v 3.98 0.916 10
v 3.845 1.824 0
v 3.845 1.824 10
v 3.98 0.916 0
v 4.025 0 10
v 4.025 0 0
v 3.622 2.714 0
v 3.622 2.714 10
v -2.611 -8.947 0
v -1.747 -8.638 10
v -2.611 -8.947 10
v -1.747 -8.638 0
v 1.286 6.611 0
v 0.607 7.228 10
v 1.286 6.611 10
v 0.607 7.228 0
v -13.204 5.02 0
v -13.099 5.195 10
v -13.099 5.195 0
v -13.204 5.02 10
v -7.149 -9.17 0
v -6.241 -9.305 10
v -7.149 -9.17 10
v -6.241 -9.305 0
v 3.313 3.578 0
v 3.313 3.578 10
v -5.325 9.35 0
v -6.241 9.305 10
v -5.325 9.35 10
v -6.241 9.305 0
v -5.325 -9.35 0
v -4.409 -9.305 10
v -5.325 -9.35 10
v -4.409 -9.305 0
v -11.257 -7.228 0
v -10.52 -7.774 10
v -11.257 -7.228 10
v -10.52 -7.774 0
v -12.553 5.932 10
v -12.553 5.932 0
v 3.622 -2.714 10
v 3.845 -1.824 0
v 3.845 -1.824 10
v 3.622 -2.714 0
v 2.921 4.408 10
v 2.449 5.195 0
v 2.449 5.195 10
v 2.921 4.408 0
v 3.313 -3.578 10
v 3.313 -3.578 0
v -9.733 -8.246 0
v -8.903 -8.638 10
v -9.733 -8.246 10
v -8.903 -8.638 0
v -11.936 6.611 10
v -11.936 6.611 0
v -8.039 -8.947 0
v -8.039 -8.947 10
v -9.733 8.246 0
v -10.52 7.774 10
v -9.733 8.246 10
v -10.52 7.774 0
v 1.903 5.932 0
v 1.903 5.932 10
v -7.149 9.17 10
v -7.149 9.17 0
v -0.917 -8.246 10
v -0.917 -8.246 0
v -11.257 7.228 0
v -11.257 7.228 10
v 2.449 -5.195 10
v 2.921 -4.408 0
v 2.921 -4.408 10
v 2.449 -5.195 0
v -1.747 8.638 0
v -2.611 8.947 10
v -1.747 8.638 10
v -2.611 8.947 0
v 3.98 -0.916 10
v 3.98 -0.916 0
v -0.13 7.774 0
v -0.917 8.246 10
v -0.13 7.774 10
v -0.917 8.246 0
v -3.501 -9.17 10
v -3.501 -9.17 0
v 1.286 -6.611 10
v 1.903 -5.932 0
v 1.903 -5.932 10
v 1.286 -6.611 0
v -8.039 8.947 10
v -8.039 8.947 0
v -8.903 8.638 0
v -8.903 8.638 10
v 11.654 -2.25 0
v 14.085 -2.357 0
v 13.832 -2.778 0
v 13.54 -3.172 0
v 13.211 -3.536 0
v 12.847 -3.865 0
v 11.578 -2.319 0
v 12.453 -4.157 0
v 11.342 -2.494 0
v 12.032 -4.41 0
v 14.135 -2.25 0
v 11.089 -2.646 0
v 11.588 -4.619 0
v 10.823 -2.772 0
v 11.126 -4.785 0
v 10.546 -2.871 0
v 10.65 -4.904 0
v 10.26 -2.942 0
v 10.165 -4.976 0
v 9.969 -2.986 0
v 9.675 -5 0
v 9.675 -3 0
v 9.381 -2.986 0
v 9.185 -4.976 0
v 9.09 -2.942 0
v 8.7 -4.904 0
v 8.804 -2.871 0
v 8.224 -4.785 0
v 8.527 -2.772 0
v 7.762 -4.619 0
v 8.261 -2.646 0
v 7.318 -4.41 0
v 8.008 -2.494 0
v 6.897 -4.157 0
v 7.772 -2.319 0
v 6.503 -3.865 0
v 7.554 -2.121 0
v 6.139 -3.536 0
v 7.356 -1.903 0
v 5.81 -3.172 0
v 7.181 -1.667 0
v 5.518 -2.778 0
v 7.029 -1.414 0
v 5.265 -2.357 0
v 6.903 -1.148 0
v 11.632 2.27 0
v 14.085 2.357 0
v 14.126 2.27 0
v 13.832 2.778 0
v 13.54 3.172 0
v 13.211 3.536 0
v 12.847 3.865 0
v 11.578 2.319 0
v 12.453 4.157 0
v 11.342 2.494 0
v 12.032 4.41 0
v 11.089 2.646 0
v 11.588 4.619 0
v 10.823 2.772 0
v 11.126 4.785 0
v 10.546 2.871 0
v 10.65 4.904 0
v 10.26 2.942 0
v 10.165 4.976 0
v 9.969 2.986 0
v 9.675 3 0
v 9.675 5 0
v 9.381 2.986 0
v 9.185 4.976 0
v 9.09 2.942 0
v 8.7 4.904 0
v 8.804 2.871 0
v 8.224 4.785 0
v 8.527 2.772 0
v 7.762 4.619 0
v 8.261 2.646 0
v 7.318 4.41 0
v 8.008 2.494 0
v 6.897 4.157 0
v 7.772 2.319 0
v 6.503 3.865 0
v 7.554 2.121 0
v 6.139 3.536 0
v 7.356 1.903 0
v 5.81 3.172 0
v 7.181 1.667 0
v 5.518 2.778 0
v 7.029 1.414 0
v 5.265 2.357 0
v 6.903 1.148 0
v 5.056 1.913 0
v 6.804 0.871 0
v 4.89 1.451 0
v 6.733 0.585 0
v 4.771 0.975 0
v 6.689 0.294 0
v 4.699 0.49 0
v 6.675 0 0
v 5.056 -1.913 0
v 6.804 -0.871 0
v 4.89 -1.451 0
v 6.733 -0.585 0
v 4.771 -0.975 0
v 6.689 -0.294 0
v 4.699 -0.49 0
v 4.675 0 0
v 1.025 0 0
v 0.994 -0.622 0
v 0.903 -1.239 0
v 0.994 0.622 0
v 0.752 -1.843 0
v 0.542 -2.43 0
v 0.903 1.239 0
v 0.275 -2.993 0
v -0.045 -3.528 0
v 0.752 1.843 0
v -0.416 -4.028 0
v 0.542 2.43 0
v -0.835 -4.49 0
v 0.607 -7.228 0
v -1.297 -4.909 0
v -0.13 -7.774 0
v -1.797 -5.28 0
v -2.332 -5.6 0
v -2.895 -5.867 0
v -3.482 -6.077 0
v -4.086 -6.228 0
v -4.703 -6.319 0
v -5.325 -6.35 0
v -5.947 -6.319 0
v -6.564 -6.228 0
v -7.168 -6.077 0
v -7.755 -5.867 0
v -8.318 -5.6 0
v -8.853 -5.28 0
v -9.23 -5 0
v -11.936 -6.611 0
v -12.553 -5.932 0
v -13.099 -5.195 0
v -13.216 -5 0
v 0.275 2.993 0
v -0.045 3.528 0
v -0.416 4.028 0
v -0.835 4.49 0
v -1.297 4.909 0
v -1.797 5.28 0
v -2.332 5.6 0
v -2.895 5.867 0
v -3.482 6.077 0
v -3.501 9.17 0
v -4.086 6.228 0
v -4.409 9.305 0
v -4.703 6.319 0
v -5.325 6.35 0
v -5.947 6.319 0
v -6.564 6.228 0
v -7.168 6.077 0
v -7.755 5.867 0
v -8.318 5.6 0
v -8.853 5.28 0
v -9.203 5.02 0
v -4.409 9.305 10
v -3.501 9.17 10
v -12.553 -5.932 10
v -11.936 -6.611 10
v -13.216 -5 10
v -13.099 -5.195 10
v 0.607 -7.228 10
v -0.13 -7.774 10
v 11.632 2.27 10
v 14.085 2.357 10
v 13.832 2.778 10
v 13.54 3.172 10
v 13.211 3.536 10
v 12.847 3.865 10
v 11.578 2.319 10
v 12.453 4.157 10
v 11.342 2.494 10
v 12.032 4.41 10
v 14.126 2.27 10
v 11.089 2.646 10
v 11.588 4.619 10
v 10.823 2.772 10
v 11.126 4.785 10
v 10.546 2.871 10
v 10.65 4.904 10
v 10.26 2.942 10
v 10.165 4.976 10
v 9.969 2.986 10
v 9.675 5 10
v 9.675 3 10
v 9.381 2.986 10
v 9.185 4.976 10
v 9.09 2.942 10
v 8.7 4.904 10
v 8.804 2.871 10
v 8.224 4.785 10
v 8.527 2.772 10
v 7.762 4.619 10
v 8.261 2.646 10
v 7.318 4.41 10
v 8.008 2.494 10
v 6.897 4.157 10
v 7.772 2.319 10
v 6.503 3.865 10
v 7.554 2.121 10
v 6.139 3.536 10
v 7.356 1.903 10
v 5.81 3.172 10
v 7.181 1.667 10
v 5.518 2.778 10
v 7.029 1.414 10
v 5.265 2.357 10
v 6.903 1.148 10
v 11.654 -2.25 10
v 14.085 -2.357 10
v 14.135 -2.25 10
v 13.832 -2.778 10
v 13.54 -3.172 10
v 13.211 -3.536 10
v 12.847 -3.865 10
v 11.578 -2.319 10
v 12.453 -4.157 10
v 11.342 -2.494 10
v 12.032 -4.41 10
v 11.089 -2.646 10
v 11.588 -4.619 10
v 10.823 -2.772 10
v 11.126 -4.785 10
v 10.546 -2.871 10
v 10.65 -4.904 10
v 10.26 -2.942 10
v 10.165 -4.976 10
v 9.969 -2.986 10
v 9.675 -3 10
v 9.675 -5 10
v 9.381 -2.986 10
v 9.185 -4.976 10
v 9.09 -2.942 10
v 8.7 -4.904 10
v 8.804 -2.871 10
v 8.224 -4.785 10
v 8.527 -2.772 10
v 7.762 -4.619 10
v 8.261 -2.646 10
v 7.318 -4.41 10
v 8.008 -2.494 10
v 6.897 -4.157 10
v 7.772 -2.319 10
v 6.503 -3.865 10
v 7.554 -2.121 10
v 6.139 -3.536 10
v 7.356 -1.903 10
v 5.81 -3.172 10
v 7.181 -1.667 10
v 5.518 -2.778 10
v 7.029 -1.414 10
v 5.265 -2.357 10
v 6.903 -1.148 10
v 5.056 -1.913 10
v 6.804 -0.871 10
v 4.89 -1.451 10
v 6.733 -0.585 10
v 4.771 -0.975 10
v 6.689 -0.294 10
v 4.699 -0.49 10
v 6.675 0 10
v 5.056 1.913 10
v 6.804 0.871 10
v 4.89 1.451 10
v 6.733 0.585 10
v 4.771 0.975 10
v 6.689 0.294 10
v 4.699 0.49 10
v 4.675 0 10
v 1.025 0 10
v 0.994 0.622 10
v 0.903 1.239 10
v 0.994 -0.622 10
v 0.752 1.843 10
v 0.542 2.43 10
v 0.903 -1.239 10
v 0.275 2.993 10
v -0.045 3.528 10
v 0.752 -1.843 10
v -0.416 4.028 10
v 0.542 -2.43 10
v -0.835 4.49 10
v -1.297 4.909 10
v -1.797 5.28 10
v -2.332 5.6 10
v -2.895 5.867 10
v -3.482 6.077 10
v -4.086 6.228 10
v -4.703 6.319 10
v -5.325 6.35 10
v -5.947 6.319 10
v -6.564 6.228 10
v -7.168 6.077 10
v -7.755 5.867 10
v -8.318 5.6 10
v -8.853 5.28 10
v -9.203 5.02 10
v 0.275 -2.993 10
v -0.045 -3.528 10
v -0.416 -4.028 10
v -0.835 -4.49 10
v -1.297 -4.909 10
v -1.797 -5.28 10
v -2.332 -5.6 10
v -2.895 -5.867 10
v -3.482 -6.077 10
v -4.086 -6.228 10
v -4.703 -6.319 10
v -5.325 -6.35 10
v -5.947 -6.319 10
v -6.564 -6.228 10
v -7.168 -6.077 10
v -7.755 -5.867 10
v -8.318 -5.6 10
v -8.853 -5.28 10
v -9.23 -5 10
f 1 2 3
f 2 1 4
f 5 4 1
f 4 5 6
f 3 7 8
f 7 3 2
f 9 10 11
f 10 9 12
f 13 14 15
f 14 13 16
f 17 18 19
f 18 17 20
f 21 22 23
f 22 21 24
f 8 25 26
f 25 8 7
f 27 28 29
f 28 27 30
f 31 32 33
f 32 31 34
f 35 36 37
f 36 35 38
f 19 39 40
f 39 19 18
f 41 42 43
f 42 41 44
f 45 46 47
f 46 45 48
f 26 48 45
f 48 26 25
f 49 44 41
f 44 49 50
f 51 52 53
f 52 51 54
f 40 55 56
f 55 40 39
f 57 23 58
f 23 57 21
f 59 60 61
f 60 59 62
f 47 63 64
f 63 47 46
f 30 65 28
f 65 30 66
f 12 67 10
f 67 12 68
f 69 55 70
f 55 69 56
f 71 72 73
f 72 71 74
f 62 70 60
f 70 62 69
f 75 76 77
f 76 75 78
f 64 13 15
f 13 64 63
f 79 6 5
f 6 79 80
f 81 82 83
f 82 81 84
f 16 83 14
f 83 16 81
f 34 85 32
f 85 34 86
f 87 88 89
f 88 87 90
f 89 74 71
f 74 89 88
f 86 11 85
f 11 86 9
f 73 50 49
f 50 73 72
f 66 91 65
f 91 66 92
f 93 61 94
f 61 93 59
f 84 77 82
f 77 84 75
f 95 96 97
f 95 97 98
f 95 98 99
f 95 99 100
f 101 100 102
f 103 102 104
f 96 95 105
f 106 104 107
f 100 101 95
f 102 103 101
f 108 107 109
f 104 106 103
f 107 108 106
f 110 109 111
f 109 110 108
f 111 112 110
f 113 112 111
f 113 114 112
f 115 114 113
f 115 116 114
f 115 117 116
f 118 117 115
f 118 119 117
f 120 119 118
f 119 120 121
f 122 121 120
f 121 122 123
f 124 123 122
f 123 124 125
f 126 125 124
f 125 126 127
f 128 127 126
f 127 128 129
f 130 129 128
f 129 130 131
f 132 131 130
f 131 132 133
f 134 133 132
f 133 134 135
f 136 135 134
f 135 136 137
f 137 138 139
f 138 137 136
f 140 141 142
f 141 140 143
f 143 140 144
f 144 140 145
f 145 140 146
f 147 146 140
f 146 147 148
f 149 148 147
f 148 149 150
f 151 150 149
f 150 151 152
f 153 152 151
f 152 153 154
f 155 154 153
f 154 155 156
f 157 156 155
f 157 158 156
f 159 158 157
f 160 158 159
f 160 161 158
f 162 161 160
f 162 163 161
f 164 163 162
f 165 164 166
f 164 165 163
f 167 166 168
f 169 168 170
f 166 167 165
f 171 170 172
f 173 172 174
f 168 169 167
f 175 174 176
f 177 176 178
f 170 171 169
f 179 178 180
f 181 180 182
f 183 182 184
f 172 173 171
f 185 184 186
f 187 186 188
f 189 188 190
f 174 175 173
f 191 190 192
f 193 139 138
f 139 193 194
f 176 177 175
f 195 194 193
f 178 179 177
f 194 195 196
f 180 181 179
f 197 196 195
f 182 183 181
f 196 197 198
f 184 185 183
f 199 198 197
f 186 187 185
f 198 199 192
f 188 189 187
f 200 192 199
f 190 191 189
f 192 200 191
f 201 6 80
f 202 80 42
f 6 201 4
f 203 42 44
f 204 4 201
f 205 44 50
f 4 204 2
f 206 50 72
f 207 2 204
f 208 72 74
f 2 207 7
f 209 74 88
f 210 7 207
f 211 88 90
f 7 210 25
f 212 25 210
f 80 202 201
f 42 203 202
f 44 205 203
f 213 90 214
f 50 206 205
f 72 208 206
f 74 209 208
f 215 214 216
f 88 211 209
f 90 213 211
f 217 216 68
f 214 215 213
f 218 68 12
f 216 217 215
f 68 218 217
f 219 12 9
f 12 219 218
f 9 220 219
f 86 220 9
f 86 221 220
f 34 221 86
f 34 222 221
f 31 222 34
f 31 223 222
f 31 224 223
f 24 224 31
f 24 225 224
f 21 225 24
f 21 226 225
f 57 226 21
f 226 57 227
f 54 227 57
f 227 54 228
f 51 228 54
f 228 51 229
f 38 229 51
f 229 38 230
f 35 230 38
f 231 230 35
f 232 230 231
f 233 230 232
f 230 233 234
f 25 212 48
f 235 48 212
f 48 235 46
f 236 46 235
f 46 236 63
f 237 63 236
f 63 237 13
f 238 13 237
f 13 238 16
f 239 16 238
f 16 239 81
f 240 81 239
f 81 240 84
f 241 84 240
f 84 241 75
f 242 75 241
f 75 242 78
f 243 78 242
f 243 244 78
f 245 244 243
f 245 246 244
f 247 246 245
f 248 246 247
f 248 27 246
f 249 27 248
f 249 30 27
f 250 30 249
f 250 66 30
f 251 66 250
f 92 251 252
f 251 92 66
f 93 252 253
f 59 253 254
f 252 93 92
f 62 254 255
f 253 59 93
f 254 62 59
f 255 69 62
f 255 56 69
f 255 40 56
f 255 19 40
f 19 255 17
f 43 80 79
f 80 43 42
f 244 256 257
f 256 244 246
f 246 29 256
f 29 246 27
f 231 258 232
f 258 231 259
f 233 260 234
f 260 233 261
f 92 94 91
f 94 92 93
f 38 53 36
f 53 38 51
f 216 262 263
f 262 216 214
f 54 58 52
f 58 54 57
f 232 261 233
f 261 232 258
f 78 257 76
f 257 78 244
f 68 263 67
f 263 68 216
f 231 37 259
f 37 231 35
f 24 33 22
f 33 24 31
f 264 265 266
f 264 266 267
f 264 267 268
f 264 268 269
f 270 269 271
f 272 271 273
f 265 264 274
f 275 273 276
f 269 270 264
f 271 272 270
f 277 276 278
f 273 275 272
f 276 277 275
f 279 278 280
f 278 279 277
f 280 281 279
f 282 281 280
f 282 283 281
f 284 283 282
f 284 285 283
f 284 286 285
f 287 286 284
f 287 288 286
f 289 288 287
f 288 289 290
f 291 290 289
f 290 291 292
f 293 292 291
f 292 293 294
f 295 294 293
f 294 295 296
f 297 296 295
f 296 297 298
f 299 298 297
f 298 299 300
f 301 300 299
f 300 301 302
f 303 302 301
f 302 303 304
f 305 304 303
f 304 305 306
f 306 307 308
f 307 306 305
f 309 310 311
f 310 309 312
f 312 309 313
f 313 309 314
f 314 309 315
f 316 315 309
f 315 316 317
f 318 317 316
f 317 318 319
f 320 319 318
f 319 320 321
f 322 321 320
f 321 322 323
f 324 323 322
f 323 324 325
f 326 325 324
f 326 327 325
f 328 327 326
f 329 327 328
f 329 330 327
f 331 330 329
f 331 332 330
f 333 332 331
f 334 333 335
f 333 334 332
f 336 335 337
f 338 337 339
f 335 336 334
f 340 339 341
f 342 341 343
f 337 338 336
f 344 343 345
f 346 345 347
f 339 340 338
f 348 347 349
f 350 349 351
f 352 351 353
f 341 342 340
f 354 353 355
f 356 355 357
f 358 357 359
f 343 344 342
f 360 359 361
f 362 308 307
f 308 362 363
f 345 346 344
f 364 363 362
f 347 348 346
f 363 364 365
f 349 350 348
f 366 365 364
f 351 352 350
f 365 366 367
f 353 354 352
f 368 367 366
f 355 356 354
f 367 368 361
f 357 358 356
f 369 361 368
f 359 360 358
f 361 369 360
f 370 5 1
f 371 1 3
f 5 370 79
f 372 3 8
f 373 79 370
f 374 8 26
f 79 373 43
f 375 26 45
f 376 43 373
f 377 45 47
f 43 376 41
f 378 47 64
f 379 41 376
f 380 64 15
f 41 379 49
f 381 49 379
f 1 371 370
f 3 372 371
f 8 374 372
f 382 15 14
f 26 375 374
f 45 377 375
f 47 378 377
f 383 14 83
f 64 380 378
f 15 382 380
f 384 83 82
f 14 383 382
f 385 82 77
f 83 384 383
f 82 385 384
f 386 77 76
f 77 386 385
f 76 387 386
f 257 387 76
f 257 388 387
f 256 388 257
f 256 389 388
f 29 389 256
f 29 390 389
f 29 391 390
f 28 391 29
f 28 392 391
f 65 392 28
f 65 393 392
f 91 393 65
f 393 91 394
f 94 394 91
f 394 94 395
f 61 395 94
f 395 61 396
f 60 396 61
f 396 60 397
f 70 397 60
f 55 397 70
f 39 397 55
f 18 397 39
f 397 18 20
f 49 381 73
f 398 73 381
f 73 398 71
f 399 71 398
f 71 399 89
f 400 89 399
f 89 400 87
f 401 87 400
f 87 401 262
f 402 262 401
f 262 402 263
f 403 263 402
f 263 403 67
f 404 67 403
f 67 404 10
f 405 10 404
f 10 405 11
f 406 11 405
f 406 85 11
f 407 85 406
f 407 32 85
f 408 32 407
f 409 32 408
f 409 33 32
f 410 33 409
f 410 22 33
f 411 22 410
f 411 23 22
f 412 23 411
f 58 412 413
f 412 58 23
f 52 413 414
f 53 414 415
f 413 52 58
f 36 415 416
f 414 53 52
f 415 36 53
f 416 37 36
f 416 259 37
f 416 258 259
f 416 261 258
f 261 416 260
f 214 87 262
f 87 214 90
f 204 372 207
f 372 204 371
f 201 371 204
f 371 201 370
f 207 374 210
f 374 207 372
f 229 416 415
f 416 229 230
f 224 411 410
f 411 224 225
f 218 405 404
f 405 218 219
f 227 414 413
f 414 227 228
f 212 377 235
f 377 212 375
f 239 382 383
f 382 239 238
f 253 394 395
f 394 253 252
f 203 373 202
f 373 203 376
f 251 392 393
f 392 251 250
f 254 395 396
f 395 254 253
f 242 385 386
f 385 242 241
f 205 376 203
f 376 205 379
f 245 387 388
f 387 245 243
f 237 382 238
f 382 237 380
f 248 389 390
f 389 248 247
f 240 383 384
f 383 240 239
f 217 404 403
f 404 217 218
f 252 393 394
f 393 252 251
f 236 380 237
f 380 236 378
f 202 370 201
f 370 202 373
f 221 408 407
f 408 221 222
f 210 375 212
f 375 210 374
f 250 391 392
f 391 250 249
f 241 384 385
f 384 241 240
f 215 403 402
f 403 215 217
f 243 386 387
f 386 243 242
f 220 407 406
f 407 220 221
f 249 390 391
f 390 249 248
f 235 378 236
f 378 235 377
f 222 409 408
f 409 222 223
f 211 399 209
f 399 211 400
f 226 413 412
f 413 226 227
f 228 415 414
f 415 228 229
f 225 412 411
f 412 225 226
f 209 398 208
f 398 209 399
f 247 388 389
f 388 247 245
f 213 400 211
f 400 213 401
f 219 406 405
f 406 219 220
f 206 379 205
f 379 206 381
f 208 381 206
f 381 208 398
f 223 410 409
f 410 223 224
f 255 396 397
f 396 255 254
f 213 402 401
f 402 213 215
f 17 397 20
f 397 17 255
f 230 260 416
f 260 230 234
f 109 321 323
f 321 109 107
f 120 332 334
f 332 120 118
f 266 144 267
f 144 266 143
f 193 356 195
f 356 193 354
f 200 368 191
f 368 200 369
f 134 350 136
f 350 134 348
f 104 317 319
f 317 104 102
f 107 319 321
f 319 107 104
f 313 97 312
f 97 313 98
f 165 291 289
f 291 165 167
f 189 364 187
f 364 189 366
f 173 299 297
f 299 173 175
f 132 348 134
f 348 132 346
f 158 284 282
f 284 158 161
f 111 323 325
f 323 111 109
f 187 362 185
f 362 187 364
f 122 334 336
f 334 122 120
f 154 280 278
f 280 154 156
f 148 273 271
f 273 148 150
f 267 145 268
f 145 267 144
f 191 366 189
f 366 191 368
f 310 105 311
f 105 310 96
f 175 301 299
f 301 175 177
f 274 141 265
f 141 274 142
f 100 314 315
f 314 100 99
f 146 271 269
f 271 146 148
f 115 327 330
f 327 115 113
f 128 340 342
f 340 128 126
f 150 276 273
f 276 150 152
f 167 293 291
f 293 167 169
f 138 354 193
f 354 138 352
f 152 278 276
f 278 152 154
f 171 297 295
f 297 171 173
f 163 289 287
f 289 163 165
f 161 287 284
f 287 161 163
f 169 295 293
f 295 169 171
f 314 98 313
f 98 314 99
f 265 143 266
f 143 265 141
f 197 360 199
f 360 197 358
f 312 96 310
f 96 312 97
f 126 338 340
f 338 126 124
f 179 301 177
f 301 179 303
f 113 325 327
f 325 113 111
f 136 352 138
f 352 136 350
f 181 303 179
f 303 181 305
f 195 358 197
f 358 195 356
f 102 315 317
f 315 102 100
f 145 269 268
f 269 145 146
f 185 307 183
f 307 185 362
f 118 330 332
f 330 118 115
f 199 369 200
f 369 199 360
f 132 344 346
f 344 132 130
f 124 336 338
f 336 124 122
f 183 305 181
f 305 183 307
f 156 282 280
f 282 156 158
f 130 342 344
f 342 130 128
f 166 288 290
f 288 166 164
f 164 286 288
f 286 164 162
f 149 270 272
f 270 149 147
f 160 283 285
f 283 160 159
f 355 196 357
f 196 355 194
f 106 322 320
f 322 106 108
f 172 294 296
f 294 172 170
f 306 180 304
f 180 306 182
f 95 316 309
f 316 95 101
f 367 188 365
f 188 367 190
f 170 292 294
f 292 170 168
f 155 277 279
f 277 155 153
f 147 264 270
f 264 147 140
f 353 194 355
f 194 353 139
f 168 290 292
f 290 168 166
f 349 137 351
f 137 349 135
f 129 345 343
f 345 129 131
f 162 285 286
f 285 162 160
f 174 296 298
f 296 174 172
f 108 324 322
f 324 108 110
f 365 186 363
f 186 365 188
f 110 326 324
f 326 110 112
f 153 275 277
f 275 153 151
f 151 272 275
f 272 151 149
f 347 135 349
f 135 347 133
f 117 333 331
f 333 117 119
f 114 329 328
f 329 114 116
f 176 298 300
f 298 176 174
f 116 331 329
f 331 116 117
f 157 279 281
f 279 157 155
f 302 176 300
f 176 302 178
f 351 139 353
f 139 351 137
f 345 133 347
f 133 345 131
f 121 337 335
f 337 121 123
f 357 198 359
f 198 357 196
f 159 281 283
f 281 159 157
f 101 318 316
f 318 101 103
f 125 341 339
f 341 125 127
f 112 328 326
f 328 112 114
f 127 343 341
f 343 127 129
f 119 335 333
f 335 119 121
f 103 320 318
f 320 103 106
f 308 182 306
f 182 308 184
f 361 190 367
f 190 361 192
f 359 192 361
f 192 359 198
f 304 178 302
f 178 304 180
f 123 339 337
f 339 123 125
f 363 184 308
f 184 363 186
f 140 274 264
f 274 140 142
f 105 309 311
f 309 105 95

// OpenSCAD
// ---------- Parameters ----------
rod_inner_d   = 12.7;          // inner diameter of the rod ring (mm)
rod_wall      = 3;            // wall thickness of the rod ring (mm)
rod_outer_d   = rod_inner_d + 2*rod_wall; // outer diameter of the rod ring (mm)

tubing_inner_d = 6;           // inner diameter of the tubing ring (mm)
tubing_wall    = 2;           // wall thickness of the tubing ring (mm)
tubing_outer_d = tubing_inner_d + 2*tubing_wall; // outer diameter of the tubing ring (mm)

rod_center     = [0,0];       // centre of the rod ring (mm)
tubing_center = [15,0];      // centre of the tubing ring (mm)

bridge_x_start = 8;           // left x‑edge of the bridge (mm)
bridge_x_end   = 12;          // right x‑edge of the bridge (mm)
bridge_width_y = 6;           // total width in Y direction (mm)

height = 10;                  // extrusion height (mm)

$fn = 64;                     // resolution for circles/cylinders

// ---------- Global XY centering ----------
min_x = -rod_outer_d/2;                     // leftmost point of the whole part
max_x = tubing_center[0] + tubing_outer_d/2; // rightmost point of the whole part
center_shift_x = -( (max_x + min_x)/2 );    // shift needed to centre on origin

// ---------- Helper modules ----------
module rod_outer() {
    translate(rod_center)
        cylinder(r=rod_outer_d/2, h=height, center=true);
}
module rod_inner_cut() {
    translate(rod_center)
        cylinder(r=rod_inner_d/2, h=height+0.02, center=true);
}
module tubing_outer() {
    translate(tubing_center)
        cylinder(r=tubing_outer_d/2, h=height, center=true);
}
module tubing_inner_cut() {
    translate(tubing_center)
        cylinder(r=tubing_inner_d/2, h=height+0.02, center=true);
}

// ---------- Ring constructions ----------
module rod_ring() {
    difference(){
        rod_outer();
        rod_inner_cut();
        // Opening on the -X side (x < 0, -5 < y < 5)
        translate([-200, -5, -height/2-0.01])
            cube([200, 10.02, height+0.02]); // extends far beyond the ring
    }
}
module tubing_ring() {
    difference(){
        tubing_outer();
        tubing_inner_cut();
        // Opening on the +X side (x > 15, -2.25 < y < 2.25)
        translate([tubing_center[0], -2.25, -height/2-0.01])
            cube([200, 4.52, height+0.02]); // extends far beyond the ring
    }
}

// ---------- Bridge ----------
module bridge_block() {
    // Solid rectangular block that will be intersected with the outer cylinders
    translate([ (bridge_x_start+bridge_x_end)/2, 0, 0])
        cube([bridge_x_end-bridge_x_start, bridge_width_y, height], center=true);
}
module bridge() {
    // Intersect the block with the union of the two outer cylinders
    intersection(){
        bridge_block();
        union(){
            rod_outer();
            tubing_outer();
        }
    }
}

// ---------- Assembly ----------
translate([center_shift_x, 0, height/2])   // centre XY and raise bottom to Z = 0
union(){
    rod_ring();
    tubing_ring();
    bridge();
}
